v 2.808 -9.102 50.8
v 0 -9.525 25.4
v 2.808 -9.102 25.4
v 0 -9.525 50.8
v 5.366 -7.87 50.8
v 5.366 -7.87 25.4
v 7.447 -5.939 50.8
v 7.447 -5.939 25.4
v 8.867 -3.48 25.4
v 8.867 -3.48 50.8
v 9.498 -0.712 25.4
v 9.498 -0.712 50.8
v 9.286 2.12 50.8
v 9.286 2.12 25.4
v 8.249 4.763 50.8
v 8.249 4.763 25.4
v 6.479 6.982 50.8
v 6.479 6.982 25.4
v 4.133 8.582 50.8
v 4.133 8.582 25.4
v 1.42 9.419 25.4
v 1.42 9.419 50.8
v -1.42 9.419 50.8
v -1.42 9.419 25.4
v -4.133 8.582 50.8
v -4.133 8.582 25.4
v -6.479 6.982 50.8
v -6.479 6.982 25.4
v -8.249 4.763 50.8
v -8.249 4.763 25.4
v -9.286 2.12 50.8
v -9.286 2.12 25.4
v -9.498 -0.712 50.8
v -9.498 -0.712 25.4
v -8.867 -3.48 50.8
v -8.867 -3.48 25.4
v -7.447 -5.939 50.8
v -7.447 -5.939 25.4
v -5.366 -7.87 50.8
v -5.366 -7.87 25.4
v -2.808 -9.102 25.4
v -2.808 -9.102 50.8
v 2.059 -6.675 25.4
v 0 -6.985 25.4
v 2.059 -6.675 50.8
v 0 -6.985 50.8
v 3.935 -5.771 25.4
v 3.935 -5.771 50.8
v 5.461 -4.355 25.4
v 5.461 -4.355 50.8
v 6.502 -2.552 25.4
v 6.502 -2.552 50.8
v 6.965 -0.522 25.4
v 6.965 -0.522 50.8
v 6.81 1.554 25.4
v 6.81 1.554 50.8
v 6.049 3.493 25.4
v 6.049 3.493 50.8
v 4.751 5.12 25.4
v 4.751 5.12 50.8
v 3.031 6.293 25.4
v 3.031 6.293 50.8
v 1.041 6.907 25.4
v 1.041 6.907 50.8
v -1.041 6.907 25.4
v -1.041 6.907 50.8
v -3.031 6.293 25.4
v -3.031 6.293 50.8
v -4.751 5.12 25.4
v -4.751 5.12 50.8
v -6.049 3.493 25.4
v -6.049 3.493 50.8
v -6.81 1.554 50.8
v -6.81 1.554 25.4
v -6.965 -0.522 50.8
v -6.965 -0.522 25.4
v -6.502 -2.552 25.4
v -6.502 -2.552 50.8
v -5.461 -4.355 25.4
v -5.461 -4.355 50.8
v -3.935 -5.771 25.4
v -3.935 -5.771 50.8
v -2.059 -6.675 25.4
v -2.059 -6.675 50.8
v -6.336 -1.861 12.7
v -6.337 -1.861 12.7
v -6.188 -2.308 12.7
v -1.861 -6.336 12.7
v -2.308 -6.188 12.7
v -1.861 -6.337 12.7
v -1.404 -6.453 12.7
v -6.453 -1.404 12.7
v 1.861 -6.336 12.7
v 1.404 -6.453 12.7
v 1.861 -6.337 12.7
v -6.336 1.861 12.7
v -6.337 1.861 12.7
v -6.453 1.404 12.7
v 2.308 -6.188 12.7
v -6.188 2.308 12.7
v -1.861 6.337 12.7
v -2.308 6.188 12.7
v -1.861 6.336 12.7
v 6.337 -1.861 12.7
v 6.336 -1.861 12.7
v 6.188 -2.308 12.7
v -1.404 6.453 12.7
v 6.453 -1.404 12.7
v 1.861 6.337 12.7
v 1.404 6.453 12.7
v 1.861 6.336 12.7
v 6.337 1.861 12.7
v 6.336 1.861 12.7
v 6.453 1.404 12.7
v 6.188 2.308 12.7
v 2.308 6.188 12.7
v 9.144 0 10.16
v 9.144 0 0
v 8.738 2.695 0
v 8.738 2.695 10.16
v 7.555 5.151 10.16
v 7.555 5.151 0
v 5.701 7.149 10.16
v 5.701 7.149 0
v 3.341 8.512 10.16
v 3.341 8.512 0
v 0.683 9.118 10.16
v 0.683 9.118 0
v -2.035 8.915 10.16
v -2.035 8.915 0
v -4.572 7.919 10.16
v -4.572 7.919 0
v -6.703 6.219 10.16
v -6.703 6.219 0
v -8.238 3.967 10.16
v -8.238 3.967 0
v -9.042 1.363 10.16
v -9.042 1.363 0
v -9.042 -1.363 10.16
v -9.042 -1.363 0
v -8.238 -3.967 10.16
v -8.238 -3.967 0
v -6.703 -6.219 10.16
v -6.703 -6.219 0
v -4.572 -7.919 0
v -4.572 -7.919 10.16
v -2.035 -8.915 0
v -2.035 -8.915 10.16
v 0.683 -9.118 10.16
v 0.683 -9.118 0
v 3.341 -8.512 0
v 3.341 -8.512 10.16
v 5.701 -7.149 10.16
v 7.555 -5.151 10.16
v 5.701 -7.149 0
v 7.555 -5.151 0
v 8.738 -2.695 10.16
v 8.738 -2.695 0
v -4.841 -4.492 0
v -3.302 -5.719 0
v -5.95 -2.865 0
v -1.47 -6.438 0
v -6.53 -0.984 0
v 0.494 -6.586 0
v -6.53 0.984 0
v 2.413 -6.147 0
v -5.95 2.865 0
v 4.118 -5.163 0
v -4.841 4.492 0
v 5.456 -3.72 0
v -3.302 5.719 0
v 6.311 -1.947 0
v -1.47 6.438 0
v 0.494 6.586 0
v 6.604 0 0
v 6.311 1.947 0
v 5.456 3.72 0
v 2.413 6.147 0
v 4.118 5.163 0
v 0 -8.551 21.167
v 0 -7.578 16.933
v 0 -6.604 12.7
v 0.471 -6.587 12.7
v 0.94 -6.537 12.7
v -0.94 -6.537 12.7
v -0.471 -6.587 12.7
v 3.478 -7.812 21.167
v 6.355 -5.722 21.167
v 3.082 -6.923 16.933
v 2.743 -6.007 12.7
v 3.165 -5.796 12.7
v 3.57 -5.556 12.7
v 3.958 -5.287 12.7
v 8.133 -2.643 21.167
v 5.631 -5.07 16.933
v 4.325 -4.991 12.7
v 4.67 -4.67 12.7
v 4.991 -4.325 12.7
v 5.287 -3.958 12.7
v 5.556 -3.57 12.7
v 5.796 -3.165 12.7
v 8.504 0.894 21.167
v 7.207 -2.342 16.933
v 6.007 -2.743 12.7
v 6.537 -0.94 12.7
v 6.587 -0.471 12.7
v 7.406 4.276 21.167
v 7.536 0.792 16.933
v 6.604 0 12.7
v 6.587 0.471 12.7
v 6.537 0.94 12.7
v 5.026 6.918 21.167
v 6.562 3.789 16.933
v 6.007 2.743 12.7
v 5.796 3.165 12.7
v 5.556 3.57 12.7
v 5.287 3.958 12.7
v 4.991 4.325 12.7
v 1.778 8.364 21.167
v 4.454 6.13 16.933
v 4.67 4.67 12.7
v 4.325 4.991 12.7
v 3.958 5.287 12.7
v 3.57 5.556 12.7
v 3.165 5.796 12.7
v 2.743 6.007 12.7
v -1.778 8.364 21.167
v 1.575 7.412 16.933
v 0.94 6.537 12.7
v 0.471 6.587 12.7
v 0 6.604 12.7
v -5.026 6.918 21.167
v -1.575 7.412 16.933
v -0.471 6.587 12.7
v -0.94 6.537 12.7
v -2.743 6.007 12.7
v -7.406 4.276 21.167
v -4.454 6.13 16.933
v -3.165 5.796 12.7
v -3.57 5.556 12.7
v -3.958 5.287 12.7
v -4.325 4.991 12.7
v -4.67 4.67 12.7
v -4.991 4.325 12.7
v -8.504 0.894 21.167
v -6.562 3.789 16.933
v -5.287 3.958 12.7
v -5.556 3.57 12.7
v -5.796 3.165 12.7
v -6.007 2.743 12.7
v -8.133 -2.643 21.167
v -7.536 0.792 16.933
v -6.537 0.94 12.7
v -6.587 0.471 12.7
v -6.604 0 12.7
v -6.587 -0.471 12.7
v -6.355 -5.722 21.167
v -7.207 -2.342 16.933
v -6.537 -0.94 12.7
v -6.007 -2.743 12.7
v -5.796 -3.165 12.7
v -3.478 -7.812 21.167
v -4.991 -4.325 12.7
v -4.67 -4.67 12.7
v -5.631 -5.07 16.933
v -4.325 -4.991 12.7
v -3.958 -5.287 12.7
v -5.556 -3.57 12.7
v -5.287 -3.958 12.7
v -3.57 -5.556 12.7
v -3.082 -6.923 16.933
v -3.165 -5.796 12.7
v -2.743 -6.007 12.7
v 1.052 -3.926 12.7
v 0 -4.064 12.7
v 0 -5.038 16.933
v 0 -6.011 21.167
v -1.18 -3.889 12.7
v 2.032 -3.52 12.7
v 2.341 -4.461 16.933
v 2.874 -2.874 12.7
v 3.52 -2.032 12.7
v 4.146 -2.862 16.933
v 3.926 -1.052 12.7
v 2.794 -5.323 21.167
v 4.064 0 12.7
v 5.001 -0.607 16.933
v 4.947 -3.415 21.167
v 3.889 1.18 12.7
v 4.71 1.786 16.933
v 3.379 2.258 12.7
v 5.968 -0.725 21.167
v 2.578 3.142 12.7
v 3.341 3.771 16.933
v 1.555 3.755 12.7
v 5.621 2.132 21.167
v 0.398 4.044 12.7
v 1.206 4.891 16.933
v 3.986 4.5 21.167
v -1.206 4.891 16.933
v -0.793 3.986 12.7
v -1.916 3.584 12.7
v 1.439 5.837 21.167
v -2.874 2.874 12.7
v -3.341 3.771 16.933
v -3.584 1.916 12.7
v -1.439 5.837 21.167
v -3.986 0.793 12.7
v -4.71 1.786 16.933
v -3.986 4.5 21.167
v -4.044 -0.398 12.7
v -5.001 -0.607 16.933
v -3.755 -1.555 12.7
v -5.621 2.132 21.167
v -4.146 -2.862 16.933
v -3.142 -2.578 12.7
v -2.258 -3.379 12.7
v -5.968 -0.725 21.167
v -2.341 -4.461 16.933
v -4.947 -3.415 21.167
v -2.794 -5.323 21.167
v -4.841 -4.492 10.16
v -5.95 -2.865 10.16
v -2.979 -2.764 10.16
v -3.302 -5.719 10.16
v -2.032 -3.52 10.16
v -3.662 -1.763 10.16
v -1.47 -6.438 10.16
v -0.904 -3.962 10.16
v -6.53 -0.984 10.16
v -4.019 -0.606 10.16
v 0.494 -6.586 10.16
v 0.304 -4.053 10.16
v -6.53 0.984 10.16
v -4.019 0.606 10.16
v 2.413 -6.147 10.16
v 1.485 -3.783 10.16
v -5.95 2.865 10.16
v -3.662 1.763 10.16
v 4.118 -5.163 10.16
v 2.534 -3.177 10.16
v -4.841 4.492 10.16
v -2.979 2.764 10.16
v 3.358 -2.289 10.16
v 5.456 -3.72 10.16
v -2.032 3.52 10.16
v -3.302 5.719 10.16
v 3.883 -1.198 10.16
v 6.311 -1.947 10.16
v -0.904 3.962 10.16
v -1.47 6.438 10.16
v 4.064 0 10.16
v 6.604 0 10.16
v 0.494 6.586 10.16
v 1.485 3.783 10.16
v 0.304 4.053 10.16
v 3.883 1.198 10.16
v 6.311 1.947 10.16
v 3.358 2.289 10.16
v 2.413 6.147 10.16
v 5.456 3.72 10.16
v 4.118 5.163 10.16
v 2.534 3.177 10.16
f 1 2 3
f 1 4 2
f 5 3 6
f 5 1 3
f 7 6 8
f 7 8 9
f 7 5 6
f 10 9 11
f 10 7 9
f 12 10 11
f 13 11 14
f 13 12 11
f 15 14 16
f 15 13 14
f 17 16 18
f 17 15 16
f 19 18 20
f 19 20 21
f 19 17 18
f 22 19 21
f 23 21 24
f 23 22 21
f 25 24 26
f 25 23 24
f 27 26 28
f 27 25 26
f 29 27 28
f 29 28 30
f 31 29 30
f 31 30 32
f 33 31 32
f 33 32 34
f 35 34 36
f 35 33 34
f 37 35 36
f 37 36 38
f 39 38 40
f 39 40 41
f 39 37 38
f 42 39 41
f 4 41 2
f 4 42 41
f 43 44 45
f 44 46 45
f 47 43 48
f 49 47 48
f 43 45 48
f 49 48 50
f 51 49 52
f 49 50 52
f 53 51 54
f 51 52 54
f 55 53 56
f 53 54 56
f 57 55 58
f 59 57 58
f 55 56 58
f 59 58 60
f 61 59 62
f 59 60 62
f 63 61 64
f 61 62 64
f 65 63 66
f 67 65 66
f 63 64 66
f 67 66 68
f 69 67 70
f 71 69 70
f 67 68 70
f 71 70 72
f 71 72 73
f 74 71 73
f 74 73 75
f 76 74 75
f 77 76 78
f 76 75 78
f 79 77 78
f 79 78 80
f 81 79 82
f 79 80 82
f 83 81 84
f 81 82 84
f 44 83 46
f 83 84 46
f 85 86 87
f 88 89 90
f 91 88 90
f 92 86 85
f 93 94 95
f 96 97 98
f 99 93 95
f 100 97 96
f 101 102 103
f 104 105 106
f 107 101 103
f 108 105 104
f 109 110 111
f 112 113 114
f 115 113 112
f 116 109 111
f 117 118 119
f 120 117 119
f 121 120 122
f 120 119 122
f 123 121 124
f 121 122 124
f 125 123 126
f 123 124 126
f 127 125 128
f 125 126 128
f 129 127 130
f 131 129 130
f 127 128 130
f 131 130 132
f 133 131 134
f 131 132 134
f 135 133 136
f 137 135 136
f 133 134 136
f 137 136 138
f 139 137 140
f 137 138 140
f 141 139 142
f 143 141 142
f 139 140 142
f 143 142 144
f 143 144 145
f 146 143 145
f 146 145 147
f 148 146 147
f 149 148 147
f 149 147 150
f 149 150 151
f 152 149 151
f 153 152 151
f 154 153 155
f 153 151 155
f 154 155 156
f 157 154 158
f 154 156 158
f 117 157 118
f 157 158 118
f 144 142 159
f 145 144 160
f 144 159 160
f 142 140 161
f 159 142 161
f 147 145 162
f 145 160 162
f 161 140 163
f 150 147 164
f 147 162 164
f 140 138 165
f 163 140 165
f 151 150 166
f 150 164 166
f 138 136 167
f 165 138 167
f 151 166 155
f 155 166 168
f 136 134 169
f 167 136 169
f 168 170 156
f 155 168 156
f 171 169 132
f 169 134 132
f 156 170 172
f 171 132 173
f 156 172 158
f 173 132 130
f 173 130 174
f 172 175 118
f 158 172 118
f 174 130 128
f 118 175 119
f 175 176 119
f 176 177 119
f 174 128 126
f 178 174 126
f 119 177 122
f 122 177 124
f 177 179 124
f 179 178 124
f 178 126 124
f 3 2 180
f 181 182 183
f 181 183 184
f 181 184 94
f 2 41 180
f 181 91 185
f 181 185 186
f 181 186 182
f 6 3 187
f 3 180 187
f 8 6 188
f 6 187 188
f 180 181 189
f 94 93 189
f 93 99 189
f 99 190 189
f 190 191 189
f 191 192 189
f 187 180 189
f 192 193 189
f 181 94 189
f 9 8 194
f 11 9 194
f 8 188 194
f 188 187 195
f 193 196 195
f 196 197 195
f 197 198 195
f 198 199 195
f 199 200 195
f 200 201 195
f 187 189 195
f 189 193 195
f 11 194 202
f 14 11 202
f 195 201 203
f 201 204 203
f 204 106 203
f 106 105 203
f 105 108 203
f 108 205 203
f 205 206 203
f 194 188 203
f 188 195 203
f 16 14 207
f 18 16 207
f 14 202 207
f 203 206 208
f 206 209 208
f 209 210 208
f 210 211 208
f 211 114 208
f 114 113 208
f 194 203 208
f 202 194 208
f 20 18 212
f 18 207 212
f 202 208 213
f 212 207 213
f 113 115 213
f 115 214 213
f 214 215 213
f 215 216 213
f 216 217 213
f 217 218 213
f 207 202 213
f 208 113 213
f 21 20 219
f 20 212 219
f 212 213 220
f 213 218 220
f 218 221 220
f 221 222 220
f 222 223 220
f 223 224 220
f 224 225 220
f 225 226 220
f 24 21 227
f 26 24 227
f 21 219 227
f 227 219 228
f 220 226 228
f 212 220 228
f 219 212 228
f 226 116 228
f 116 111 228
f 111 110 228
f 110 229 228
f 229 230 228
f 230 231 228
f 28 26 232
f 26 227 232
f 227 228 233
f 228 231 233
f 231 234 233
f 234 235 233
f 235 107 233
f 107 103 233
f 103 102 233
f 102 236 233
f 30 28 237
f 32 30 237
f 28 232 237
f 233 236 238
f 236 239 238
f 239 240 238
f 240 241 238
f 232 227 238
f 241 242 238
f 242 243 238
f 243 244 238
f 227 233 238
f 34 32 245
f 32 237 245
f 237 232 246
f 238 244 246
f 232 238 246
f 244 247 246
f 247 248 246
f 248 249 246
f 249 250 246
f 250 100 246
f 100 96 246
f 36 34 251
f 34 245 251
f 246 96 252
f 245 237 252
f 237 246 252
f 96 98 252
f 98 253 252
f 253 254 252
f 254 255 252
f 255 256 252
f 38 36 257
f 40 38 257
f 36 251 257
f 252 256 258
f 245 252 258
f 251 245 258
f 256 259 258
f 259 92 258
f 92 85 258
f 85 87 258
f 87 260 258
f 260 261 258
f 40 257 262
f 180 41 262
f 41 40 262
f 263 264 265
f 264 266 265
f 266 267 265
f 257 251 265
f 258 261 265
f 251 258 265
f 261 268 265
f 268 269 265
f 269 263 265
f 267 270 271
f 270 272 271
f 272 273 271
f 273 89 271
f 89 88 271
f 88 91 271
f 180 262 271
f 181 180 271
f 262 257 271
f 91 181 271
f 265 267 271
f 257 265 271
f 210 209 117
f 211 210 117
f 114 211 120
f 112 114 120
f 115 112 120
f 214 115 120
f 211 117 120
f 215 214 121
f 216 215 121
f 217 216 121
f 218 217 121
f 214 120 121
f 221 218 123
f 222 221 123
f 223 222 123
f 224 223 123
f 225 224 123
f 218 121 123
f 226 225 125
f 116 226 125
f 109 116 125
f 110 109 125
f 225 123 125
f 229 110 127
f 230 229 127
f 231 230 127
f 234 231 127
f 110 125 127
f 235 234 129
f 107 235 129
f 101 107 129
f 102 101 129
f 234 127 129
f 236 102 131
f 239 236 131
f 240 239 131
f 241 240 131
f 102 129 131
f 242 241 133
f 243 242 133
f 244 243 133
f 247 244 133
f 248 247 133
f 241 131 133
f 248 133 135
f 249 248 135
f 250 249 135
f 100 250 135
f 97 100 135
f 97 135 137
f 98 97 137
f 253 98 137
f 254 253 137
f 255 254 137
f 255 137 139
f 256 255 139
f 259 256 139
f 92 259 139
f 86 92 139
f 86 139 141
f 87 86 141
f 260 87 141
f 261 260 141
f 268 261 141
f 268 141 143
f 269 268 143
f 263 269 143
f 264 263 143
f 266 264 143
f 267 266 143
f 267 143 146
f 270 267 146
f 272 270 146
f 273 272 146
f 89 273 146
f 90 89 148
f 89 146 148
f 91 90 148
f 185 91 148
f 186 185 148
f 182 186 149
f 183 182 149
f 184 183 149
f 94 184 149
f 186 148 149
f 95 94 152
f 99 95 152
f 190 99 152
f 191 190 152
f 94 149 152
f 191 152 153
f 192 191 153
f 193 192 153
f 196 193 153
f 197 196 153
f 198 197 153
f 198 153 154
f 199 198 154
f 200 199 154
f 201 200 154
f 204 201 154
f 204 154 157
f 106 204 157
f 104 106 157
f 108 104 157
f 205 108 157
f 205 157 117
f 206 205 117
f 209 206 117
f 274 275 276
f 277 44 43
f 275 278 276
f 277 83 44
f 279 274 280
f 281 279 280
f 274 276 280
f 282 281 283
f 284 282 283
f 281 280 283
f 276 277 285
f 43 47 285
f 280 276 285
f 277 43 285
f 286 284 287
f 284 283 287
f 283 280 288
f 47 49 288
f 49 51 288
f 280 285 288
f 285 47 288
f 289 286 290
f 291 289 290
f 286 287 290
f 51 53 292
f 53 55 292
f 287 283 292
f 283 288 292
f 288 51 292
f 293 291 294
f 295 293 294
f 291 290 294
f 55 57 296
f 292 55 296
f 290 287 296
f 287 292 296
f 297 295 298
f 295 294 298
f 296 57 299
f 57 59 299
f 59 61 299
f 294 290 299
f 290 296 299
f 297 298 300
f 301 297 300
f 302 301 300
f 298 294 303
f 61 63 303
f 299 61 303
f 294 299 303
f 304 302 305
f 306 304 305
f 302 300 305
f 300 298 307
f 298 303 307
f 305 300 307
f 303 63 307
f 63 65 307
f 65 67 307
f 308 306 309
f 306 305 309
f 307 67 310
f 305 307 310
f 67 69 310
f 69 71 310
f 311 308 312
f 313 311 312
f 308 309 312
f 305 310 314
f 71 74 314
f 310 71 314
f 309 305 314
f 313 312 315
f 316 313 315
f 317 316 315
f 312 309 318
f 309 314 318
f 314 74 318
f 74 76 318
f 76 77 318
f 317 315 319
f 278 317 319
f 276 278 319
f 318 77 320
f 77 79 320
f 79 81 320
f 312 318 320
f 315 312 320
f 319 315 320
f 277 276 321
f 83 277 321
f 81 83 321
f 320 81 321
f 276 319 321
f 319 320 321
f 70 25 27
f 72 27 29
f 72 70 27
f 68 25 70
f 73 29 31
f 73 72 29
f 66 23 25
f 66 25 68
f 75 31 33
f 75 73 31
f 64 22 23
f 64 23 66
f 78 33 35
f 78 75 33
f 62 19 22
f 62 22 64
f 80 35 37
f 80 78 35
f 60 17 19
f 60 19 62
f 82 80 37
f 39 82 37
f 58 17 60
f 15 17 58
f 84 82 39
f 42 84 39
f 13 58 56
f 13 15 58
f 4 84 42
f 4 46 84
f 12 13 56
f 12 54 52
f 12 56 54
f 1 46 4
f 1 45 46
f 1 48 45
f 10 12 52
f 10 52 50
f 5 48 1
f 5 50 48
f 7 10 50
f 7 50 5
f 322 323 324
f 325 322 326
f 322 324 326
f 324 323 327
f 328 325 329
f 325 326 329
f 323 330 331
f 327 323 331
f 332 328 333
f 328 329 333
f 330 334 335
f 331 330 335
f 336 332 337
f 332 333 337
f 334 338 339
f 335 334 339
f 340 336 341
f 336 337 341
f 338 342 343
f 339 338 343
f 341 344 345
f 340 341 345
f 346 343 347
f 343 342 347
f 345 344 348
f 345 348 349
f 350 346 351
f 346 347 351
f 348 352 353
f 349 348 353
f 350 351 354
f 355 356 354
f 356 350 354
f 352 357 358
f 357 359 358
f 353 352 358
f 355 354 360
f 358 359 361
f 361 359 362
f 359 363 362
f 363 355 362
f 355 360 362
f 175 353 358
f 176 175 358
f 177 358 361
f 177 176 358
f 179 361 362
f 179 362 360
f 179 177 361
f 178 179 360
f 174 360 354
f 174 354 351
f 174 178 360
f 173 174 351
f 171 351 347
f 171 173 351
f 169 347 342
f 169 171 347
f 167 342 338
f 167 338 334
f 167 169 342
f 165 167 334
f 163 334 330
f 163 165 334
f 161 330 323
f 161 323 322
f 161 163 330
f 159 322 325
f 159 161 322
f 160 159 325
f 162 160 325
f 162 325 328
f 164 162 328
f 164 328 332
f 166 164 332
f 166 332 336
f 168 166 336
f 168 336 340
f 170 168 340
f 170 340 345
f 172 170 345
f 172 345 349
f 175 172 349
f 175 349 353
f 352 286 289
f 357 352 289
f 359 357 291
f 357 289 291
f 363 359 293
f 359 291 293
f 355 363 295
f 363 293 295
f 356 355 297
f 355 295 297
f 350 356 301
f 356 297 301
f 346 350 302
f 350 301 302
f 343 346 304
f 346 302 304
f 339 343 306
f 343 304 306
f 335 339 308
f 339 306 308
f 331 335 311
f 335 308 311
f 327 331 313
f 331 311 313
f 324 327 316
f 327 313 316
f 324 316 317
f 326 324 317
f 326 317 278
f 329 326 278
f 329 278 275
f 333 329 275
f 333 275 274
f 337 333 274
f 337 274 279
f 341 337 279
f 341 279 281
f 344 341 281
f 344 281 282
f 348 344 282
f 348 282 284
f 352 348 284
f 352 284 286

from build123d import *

# Parameters (mm, degrees)
F0_R     = 9.144
F0_R_2   = 6.604
F1_DEPTH = 12.7
F4_R     = 6.604
F4_R_2   = 4.064
F5_DEPTH = 2.54
F2_W     = 2.54
F2_H     = 25.4
F7_SIZE  = 2.53999


# Not quite as in the source:
# - a fillet or chamfer is up to 0.001 mm smaller than in the source, because OpenCascade refuses the exact size


with BuildPart() as f1:
    # F0 (on Top) → F1 (new body)
    with BuildSketch(Plane.XY):
        Circle(F0_R)
        Circle(F0_R_2, mode=Mode.SUBTRACT)
    extrude(amount=F1_DEPTH)

    # F4 (on offset) → F5 (join)
    with BuildSketch(Plane.XY.offset(12.7)):
        Circle(F4_R)
        Circle(F4_R_2, mode=Mode.SUBTRACT)
    extrude(amount=-F5_DEPTH)

    # F2 (on Right) → F6 (revolve)
    with BuildSketch(Plane.YZ):
        Polygon((-9.525, 25.4), (-6.604, 12.7), (-4.064, 12.7), (-6.985, 25.4), align=None)
        with Locations((-8.255, 38.1)):
            Rectangle(F2_W, F2_H)
    revolve(axis=Axis((0, 0, 0), (0, 0, 1)))

    # F7 (size 2.54 in the source; OpenCascade refuses exactly that, so slightly less here)
    f7_edges = [f1.edges().sort_by_distance(p)[0] for p in [
        (-9.144, 0, 12.7),
    ]]
    chamfer(f7_edges, length=F7_SIZE)


solid = f1.part
